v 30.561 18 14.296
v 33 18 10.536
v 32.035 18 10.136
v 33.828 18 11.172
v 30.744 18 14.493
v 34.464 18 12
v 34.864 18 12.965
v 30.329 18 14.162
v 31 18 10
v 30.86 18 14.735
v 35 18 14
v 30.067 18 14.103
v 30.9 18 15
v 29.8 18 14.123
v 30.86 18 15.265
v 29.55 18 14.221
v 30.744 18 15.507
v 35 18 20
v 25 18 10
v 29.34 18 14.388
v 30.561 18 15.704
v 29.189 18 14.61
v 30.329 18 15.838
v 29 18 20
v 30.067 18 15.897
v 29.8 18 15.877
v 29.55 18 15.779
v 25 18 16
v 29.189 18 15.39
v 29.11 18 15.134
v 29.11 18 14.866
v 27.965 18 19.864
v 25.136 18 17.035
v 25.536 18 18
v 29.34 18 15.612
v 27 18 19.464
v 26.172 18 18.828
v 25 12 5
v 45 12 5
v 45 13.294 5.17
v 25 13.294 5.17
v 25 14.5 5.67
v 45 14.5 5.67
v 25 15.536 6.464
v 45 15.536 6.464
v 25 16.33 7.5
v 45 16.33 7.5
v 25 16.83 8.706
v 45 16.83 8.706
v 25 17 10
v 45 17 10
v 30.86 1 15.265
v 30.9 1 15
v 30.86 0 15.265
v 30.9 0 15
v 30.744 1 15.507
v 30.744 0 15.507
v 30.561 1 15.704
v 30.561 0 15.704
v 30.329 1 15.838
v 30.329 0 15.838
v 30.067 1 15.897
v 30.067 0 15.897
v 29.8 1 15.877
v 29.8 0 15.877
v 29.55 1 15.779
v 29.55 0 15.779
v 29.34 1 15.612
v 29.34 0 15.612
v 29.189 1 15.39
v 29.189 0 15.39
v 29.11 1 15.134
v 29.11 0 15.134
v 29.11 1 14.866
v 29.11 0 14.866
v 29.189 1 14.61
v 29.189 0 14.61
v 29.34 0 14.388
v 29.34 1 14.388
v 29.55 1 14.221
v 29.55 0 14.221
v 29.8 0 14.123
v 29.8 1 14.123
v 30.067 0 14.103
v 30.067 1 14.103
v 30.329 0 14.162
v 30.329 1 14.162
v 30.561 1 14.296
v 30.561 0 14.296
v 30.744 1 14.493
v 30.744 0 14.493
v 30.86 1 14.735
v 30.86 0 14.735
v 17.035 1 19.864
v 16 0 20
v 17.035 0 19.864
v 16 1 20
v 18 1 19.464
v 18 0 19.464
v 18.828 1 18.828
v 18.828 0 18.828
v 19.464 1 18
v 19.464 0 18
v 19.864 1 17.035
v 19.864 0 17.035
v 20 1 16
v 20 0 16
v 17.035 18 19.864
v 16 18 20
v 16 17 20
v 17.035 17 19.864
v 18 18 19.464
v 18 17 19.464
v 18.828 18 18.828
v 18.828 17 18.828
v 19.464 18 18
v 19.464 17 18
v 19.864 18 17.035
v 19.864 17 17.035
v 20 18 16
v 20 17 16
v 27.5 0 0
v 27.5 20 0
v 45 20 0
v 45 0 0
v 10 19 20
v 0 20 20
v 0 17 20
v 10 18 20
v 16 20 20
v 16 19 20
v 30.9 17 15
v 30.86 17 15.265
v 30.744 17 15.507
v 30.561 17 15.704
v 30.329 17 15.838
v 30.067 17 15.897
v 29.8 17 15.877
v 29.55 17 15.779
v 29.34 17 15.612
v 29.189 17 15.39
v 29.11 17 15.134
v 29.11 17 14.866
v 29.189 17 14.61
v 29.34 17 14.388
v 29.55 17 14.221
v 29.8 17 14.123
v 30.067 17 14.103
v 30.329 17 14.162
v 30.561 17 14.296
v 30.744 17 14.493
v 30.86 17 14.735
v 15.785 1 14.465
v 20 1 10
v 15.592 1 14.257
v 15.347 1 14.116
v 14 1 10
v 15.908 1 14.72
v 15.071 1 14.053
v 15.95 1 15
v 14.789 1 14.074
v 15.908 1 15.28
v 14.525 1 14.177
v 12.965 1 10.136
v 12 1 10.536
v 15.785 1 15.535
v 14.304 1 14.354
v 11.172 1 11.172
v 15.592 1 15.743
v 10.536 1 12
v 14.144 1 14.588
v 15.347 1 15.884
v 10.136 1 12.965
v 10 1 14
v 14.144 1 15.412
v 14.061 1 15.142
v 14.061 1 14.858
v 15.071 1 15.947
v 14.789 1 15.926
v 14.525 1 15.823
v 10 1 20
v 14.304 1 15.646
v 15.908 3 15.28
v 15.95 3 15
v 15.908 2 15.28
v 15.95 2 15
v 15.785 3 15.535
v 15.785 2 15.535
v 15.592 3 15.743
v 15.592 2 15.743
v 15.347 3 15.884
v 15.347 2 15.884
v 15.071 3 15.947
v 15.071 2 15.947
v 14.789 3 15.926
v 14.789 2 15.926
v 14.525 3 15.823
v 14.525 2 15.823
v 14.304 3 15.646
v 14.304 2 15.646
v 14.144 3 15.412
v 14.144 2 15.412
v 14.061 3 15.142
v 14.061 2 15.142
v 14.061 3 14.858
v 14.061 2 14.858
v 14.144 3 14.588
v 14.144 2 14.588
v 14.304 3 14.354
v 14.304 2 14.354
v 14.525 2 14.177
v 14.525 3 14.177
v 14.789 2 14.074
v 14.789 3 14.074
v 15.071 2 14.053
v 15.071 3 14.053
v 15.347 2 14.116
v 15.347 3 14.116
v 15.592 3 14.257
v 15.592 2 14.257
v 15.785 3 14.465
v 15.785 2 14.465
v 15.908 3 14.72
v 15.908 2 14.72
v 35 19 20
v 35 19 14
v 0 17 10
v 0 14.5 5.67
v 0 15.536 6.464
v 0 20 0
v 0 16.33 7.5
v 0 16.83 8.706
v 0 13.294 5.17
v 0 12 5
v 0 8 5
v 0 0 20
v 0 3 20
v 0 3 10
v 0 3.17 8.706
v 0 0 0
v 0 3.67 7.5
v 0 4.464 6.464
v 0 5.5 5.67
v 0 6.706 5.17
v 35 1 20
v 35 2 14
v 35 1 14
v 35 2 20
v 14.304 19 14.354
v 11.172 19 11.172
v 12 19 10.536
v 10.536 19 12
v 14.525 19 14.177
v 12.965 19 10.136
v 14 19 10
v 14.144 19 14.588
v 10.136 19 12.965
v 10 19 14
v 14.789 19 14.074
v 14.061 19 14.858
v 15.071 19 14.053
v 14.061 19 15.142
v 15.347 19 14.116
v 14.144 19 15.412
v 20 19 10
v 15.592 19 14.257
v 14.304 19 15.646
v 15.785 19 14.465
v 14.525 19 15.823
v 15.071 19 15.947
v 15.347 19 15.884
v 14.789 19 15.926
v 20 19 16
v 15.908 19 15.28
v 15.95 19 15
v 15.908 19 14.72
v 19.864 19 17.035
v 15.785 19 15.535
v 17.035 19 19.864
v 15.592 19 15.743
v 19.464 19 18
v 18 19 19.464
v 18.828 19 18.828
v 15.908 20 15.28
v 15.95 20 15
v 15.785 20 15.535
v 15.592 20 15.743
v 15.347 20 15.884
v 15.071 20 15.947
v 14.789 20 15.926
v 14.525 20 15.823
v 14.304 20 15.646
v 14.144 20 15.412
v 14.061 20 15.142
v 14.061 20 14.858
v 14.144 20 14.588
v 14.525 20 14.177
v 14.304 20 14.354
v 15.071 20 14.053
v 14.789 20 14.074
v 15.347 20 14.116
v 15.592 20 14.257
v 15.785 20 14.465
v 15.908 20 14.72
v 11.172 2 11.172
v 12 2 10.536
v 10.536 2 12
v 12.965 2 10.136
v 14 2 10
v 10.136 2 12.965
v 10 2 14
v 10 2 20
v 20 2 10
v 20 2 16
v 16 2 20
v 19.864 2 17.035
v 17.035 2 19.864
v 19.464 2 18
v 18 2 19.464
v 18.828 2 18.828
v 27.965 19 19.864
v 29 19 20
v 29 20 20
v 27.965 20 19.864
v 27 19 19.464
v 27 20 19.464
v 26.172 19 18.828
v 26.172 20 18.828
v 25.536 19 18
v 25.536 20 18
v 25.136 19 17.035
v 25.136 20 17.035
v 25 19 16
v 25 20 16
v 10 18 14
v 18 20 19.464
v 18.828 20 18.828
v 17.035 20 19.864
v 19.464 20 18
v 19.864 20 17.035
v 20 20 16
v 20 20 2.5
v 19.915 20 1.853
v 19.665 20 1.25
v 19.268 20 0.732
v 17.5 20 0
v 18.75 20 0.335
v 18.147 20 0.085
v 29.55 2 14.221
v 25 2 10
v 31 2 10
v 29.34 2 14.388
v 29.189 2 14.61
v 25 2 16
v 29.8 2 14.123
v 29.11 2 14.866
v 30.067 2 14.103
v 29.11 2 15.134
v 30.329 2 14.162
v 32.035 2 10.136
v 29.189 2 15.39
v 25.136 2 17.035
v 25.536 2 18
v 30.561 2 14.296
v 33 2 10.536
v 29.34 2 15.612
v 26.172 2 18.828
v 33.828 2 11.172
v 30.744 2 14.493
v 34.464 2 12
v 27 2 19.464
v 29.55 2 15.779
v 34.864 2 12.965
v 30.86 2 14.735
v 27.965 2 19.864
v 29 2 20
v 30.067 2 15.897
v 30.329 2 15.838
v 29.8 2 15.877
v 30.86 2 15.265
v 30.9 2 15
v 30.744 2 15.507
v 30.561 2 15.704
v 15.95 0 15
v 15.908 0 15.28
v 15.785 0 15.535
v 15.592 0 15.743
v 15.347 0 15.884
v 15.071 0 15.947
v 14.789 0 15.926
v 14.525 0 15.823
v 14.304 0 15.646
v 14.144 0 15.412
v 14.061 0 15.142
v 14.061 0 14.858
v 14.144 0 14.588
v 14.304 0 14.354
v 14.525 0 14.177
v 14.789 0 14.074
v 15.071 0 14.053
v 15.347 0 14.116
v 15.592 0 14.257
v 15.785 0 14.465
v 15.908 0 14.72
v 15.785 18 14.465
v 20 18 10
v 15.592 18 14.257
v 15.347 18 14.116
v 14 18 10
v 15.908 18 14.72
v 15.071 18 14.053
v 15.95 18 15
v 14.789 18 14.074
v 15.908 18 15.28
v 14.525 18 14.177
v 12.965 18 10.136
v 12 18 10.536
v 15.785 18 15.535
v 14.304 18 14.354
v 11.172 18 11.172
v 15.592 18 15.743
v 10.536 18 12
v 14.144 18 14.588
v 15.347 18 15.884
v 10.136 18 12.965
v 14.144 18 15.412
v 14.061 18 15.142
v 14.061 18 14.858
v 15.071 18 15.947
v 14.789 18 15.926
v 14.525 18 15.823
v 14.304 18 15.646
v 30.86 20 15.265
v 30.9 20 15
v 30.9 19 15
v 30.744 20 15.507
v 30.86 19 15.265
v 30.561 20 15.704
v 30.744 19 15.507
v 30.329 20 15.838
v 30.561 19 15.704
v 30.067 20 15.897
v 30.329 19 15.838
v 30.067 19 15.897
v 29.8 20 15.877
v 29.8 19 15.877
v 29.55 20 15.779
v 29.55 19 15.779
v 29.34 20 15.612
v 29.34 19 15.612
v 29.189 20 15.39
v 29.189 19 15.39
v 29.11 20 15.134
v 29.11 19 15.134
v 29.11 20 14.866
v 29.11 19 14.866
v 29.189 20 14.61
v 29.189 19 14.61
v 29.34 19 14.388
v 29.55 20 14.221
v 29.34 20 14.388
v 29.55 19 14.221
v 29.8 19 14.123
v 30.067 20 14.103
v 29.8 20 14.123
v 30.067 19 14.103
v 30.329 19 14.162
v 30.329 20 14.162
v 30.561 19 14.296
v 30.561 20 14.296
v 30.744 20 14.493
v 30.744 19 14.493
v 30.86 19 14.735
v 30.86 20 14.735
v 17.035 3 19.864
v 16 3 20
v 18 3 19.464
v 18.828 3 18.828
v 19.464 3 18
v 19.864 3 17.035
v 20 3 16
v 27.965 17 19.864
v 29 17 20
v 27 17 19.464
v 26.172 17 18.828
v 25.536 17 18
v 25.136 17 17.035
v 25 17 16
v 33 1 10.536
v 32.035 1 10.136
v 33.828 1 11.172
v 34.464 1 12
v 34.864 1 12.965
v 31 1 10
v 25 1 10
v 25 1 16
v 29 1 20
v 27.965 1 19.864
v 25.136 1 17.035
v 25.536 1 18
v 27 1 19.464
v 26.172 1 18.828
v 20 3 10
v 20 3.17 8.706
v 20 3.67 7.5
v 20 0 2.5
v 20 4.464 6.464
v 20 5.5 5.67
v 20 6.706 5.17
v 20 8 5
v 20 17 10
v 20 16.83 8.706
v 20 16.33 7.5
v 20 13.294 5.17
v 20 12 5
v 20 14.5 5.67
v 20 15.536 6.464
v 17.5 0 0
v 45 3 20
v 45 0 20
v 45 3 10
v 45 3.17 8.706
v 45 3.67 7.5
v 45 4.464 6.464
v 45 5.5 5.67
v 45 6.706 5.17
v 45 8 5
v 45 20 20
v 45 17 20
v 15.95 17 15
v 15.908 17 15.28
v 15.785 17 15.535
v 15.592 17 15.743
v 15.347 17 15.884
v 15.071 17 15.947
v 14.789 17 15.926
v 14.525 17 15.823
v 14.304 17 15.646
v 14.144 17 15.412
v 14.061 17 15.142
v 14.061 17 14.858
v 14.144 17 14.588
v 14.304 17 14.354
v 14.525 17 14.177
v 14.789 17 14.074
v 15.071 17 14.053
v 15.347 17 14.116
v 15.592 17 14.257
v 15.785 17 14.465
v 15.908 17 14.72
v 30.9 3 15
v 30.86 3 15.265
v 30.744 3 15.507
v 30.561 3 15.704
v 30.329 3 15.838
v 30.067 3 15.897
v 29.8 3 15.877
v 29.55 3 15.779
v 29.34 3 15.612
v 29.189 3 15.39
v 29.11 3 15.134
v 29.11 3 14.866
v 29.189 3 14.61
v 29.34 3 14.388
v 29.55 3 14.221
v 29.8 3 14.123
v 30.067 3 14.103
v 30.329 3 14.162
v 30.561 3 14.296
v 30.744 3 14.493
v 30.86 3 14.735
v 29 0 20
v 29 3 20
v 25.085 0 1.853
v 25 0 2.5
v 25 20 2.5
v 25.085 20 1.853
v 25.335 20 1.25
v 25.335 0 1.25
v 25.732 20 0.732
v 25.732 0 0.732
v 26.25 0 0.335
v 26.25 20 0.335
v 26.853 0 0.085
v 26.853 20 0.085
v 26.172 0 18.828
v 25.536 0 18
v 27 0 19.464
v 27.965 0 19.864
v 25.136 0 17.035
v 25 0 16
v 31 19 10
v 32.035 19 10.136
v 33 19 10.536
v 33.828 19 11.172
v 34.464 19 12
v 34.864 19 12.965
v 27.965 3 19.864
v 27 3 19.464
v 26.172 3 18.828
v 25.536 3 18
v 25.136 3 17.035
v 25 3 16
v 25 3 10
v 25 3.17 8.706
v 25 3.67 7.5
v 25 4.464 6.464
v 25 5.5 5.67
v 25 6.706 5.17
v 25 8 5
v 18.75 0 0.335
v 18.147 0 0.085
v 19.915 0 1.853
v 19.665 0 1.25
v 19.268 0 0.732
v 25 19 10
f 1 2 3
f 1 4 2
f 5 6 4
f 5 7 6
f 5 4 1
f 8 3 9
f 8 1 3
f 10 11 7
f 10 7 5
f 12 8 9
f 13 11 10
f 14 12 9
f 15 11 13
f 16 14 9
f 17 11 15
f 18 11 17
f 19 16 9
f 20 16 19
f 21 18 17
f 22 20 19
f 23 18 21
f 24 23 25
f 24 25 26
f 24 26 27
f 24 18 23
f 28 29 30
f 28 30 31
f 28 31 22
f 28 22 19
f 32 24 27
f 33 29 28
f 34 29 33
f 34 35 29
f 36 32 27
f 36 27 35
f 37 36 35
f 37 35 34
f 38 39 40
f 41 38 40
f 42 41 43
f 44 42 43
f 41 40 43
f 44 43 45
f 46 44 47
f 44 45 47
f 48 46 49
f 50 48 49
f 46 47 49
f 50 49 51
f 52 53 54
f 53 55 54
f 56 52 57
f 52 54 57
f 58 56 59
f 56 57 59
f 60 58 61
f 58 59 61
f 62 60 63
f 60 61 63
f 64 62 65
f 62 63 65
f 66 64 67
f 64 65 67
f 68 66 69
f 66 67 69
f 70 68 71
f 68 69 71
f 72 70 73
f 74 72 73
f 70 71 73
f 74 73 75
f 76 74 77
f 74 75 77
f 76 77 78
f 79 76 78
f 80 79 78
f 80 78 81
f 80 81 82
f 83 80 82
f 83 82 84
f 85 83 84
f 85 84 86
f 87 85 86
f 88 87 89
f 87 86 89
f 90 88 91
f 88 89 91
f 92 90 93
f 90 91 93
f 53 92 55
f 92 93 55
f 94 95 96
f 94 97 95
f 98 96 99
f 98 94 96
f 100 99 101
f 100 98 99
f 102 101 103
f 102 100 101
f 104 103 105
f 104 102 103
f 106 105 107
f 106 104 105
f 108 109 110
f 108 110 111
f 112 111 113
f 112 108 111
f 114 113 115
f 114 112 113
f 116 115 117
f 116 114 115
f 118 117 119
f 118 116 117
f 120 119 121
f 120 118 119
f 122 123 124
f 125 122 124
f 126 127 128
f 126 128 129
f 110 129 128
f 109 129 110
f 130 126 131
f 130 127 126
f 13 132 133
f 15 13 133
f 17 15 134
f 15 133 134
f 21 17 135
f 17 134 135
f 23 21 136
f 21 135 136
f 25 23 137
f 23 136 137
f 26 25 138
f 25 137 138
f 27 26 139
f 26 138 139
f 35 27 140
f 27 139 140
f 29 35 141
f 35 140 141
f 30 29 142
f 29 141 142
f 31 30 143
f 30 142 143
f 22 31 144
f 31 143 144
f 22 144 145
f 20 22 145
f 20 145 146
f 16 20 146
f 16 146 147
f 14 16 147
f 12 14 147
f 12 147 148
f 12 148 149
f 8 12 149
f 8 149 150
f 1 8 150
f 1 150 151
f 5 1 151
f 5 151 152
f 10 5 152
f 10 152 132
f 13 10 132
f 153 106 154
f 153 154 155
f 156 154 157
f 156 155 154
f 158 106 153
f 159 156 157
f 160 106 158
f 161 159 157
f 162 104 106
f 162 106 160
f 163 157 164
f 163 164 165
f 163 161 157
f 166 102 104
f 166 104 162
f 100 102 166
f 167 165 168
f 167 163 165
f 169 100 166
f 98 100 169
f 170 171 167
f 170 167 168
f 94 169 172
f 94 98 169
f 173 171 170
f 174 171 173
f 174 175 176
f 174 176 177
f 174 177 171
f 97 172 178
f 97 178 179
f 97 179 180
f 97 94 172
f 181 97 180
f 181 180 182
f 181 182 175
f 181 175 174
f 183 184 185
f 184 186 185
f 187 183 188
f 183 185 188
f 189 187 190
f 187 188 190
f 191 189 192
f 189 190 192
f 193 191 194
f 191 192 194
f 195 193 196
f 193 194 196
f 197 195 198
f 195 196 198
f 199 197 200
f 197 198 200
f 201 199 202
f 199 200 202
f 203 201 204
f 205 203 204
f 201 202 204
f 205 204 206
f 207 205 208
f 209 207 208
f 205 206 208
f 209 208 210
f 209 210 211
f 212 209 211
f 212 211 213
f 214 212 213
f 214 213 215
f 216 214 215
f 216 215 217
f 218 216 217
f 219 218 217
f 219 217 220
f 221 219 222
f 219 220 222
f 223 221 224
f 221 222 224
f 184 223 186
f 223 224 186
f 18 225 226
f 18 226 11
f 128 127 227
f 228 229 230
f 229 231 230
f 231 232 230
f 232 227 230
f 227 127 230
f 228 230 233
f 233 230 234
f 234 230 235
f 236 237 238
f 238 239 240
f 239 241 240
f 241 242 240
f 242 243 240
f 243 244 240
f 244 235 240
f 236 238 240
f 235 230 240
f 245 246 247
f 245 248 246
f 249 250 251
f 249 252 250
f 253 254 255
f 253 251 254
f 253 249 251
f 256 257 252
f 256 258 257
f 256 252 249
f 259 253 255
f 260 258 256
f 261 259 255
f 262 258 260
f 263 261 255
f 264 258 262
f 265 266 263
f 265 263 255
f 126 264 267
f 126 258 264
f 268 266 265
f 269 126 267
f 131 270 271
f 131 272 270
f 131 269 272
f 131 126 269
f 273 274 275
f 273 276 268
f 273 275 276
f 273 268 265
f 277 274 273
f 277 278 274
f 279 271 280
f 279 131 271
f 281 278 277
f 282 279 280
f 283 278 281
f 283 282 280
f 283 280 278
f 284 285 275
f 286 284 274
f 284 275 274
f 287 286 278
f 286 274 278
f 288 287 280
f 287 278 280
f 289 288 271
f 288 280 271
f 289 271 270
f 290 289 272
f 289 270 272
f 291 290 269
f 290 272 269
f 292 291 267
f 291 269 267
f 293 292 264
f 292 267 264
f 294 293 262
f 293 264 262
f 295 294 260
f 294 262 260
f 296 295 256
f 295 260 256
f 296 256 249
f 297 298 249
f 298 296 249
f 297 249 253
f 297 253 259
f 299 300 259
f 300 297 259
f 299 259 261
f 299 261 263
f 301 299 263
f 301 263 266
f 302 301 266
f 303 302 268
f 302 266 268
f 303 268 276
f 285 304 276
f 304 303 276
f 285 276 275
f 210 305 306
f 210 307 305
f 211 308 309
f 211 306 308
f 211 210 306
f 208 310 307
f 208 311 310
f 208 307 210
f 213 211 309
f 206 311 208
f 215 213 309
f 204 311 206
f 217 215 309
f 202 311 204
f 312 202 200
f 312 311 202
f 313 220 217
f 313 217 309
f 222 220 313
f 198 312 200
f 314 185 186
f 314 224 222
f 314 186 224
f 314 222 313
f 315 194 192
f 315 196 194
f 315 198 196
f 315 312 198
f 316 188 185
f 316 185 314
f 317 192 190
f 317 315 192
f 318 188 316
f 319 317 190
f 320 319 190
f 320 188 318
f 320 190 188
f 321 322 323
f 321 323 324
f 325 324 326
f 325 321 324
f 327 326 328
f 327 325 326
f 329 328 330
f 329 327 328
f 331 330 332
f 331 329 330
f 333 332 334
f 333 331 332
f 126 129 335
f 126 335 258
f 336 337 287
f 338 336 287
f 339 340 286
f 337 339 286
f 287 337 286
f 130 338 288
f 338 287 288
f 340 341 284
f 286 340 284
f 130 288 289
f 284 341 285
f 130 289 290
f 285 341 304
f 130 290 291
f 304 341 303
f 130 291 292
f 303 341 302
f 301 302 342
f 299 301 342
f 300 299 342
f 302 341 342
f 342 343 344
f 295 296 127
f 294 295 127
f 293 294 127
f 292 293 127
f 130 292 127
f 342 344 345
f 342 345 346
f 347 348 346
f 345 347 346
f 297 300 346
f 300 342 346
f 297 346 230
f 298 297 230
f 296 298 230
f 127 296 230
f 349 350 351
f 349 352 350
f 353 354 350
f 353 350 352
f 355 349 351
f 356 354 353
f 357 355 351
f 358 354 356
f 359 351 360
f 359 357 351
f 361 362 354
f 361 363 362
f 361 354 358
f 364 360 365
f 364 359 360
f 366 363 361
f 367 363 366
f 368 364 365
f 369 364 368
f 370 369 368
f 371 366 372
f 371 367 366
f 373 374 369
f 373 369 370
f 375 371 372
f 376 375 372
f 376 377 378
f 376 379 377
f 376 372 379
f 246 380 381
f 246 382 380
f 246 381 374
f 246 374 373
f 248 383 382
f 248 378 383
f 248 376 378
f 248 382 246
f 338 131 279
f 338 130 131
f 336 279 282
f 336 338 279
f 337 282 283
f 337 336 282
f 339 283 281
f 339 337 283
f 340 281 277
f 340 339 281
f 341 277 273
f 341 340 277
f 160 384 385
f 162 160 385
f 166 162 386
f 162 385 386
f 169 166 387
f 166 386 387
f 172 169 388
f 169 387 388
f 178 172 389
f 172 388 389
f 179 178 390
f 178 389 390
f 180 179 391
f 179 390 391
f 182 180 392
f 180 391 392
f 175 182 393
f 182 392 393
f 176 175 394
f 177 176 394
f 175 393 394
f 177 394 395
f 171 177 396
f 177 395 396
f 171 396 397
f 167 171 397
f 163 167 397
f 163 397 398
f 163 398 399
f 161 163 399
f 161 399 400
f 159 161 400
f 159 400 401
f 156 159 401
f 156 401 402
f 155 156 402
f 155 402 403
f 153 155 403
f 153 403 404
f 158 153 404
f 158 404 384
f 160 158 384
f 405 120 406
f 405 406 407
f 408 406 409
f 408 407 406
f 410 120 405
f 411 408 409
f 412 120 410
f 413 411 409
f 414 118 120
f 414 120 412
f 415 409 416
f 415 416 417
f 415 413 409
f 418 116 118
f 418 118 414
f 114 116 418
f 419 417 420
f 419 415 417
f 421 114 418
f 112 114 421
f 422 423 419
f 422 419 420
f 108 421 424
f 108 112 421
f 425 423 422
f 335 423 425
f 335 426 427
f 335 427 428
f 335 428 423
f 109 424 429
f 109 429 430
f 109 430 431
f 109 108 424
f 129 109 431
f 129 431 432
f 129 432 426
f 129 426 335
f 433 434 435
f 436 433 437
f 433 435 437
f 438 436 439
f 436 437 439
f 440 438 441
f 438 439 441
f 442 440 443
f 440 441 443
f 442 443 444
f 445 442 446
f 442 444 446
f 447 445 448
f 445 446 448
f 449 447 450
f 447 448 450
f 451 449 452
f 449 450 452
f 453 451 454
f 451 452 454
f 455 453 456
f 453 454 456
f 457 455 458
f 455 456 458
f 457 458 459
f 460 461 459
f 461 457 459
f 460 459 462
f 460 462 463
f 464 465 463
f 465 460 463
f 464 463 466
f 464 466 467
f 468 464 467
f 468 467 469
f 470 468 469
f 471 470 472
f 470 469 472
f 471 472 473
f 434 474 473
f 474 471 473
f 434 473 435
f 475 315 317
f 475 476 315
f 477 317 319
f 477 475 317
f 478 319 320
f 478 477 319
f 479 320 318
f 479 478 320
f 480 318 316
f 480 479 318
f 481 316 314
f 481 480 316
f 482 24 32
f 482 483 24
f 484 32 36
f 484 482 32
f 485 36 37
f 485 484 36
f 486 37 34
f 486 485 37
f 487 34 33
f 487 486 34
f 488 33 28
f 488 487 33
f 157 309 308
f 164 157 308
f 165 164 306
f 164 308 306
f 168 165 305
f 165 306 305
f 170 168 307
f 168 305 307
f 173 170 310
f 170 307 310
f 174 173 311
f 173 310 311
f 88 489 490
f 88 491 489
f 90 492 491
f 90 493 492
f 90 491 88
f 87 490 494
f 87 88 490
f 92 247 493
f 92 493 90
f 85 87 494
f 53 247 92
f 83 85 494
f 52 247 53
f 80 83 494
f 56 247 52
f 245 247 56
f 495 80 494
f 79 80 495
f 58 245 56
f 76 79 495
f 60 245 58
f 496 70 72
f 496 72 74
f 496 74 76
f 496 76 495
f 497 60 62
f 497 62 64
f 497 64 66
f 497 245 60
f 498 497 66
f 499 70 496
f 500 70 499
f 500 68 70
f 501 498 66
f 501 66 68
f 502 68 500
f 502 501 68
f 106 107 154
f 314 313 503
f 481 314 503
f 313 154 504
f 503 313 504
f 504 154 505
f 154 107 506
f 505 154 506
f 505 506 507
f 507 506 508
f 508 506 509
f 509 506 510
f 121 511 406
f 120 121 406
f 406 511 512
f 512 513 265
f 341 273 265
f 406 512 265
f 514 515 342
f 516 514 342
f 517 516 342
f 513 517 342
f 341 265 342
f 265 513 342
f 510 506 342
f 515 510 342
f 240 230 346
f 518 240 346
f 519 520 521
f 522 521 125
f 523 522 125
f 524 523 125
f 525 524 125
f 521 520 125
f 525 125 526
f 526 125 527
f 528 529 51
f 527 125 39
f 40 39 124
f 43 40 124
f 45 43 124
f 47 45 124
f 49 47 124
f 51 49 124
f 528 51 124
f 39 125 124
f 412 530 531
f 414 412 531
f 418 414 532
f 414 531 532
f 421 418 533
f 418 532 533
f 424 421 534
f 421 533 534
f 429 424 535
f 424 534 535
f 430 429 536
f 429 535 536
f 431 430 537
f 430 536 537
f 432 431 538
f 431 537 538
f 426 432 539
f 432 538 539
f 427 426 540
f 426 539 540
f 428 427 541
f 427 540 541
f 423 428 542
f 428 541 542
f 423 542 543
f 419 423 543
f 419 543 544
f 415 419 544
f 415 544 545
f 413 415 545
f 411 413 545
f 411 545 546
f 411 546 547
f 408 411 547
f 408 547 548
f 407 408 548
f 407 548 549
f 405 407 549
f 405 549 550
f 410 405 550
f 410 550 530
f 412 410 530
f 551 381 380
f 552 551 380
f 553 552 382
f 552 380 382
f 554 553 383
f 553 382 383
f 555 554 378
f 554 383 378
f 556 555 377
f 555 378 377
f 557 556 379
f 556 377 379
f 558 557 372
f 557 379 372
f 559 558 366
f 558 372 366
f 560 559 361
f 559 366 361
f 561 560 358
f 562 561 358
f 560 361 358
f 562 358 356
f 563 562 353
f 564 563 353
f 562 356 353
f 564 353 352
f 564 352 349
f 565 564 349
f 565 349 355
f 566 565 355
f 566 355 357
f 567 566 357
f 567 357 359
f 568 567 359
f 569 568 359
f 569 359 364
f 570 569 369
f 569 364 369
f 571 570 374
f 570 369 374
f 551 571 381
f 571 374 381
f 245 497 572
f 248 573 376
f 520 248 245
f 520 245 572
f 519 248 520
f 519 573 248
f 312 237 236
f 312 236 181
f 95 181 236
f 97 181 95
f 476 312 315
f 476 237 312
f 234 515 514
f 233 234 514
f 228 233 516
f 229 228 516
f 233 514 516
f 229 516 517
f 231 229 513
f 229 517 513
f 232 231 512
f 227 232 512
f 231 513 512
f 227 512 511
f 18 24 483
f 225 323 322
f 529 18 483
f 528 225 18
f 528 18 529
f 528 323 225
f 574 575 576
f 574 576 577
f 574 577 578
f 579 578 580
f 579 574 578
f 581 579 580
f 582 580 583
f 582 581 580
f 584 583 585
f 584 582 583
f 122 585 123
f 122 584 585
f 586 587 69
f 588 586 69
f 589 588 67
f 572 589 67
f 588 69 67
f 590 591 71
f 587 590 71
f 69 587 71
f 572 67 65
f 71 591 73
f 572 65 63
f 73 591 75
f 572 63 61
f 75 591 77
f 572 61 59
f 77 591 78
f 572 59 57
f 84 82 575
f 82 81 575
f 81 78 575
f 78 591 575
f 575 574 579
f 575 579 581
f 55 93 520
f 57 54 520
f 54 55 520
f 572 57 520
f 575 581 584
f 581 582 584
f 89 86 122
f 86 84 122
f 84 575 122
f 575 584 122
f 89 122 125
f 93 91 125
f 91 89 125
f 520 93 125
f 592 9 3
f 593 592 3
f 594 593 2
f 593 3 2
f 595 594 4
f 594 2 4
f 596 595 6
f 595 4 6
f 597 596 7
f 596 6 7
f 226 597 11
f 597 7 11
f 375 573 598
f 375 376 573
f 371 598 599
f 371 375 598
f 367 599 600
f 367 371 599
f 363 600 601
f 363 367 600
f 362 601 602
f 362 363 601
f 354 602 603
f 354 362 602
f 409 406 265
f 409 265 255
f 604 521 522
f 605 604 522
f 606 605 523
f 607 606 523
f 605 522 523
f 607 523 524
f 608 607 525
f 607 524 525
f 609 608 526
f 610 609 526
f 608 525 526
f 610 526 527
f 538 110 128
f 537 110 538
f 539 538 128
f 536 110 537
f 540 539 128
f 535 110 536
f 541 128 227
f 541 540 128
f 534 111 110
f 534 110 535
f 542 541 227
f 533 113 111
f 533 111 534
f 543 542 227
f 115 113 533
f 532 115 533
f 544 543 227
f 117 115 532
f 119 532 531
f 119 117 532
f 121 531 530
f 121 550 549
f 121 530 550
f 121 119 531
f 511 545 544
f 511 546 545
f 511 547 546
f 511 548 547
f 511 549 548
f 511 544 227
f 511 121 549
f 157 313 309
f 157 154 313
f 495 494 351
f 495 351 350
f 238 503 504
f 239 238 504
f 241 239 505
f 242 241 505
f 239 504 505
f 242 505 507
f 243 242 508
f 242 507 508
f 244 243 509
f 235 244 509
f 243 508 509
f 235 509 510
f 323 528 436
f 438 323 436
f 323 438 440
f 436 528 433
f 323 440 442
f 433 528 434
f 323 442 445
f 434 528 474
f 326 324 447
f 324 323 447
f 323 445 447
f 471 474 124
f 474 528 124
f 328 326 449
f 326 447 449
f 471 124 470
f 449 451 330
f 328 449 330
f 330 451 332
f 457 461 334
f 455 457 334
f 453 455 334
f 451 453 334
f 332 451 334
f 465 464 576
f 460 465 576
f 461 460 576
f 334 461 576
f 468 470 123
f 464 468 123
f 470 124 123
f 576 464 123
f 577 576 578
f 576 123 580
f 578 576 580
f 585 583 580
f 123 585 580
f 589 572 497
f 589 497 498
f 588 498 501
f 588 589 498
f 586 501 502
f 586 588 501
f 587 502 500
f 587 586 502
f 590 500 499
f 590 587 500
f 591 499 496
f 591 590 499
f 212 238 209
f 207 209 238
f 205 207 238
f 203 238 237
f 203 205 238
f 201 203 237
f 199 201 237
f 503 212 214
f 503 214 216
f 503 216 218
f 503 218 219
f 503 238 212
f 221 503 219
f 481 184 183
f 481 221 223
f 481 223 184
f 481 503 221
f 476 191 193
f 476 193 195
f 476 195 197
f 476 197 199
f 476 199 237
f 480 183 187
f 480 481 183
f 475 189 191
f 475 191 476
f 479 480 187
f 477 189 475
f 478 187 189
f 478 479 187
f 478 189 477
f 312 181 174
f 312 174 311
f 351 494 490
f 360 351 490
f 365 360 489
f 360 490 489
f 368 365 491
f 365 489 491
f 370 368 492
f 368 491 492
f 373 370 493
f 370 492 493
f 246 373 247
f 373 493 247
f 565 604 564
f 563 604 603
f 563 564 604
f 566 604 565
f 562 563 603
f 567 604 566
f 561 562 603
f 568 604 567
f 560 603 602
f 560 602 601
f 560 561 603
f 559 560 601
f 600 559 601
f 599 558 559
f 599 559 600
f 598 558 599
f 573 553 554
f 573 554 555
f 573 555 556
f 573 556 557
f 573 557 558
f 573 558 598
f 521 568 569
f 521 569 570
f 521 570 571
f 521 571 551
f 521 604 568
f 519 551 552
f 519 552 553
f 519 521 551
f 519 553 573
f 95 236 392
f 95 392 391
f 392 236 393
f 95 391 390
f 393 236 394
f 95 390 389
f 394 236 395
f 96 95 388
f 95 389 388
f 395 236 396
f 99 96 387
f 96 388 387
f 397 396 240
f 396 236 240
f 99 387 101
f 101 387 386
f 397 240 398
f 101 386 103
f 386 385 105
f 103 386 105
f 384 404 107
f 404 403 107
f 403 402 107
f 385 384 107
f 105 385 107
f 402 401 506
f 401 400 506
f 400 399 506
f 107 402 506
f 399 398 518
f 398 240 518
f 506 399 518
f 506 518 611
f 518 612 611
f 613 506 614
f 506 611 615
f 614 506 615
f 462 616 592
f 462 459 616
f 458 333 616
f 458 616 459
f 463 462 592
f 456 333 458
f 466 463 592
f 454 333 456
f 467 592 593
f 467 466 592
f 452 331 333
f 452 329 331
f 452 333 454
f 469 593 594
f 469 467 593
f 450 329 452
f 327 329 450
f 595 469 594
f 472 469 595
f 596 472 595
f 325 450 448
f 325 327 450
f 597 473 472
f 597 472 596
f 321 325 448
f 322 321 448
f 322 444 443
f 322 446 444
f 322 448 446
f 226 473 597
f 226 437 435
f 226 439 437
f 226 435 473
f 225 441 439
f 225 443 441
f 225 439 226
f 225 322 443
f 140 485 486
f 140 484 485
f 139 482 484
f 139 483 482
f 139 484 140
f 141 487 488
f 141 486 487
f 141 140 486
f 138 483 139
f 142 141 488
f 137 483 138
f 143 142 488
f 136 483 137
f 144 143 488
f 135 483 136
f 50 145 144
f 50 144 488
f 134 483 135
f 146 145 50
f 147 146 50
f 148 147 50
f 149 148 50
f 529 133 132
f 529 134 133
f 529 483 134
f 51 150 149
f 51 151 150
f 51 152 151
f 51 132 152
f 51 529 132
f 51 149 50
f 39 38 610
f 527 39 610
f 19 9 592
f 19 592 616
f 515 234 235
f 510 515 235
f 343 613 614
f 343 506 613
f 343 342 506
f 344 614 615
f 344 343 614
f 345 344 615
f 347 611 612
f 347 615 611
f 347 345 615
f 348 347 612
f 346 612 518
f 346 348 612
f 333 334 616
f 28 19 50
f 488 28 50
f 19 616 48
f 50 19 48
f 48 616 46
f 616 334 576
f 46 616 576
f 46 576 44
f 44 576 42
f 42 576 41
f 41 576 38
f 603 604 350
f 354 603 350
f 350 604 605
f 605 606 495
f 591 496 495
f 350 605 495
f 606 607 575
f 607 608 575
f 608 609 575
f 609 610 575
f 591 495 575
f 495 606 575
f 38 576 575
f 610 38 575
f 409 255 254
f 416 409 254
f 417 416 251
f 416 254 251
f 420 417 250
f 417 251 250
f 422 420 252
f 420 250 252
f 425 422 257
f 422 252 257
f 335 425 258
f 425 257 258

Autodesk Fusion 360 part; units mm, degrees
sketch "Sketch1" plane through (0, 0, 0) normal (0, 0, 1) x (1, 0, 0)
  line L0 (0, 0) -> (20, 0)
  line L1 (20, 0) -> (20, 20)
  line L2 (20, 20) -> (0, 20)
  line L3 (0, 20) -> (0, 0)
  line L4 (25, 0) -> (45, 0)
  line L5 (45, 0) -> (45, 20)
  line L6 (45, 20) -> (25, 20)
  line L7 (25, 20) -> (25, 0)
  dimension "d40" = 5
extrude "Extrude1" add sketch "Sketch1" along normal blind 20 makes body 1 at (0, 13.3333, 6.6667) makes body 2 at (25, 13.3333, 6.6667)
sketch "Sketch2" plane through (45, 0, 0) normal (1, 0, 0) x (0, 1, 0)
  line L0 (0, 0) -> (20, 0)
  line L1 (20, 0) -> (20, 20)
  line L2 (20, 20) -> (0, 20)
  line L3 (0, 20) -> (0, 0)
  line L4 (0, 20) -> (20, 20)
  line L5 (20, 20) -> (20, 0)
  line L6 (20, 0) -> (0, 0)
  line L7 (0, 0) -> (0, 20)
  line L8 (3, 20) -> (17, 20)
  line L9 (17, 20) -> (17, 10)
  line L10 (12, 5) -> (8, 5)
  line L11 (3, 10) -> (3, 20)
  arc A0 (3, 10) -> (8, 5) centre (8, 10) ccw
  arc A1 (12, 5) -> (17, 10) centre (12, 10) ccw
  dimension "d3" = 3
  dimension "d4" = 3
  dimension "d5" = 5
  dimension "d6" = 5
extrude "Extrude2" cut sketch "Sketch2" against normal blind 50 contours L2 L4 L8 L9 L10 L11 A0 A1 bodies 1 2
fillet "Fillet1" radius 2.5 2 edges at (20, 10, 0) (25, 10, 0) on bodies 1 2
sketch "Sketch3" plane through (0, 0, 0) normal (0, 1, 0) x (1, 0, 0)
  line L0 (0, -20) -> (50, -20)
  line L1 (50, -20) -> (50, 0)
  line L2 (50, 0) -> (0, 0)
  line L3 (0, 0) -> (0, -20)
  circle A0 centre (15, -15) radius 0.95
  circle A1 centre (30, -15) radius 0.9
  dimension "d11" = 1.9
  dimension "d12" = 1.8
  dimension "d41" = 15
extrude "Extrude3" cut sketch "Sketch3" along normal up to surface (20 mm away) contours A0 | A1 bodies 1 2
sketch "Sketch4" plane through (0, 0, 20) normal (0, 0, 1) x (-1, 0, 0)
  line L0 (-20, -3) -> (0, -3)
  line L1 (0, -3) -> (0, 0)
  line L2 (0, 0) -> (-20, 0)
  line L3 (-20, 0) -> (-20, -3)
  line L4 (-35, -1) -> (-10, -1)
  line L5 (-10, -1) -> (-10, -2)
  line L6 (-10, -2) -> (-35, -2)
  line L7 (-35, -2) -> (-35, -1)
  line L8 (-35, -18) -> (-10, -18)
  line L9 (-10, -18) -> (-10, -19)
  line L10 (-10, -19) -> (-35, -19)
  line L11 (-35, -19) -> (-35, -18)
  point P0 (-25, 0)
  dimension "d15" = 10
  dimension "d16" = 10
extrude "Extrude4" cut sketch "Sketch4" against normal blind 10 contours L3 L4 L6 L7 | L3 L4 L5 L6 | L8 L9 L10 L11 bodies 1 2
fillet "Fillet2" radius 4 8 edges at (20, 19.5, 20) (20, 17.5, 20) (20, 2.5, 20) (20, 0.5, 20) (25, 19.5, 20) (25, 17.5, 20) (25, 2.5, 20) (25, 0.5, 20) on bodies 1 2
fillet "Fillet3" radius 4 4 edges at (10, 1.5, 10) (10, 18.5, 10) (35, 18.5, 10) (35, 1.5, 10) on bodies 1 2
sketch "Sketch6" plane through (0, 0, 0) normal (0, -1, 0) x (1, 0, 0)
  arc A0 (20, 16) -> (16, 20) centre (16, 16) ccw
  line L0 (16, 20) -> (0, 20)
  line L1 (0, 20) -> (0, 0)
  line L2 (0, 0) -> (17.5, 0)
  arc A1 (17.5, 0) -> (20, 2.5) centre (17.5, 2.5) ccw
  line L3 (20, 2.5) -> (20, 16)
  circle A2 centre (15, 15) radius 0.95
  circle A3 centre (15, 15) radius 4
  circle A4 centre (15, 15) radius 1.15
  line L4 (22.5, 20) -> (22.5, 0) construction
  circle A5 centre (30, 15) radius 4
  circle A6 centre (30, 15) radius 1.15
  line L5 (15, 19) -> (30, 19)
  line L6 (15, 11) -> (30, 11)
  dimension "d23" = 8
  dimension "d24" = 0.2
  dimension "d42" = 15
extrude "Extrude5" [suppressed]
extrude "Extrude6" [suppressed]
fillet "Fillet6" [suppressed]
fillet "Fillet4" [suppressed]
fillet "Fillet5" [suppressed]
chamfer "Chamfer1" [suppressed]
chamfer "Chamfer2" [suppressed]
